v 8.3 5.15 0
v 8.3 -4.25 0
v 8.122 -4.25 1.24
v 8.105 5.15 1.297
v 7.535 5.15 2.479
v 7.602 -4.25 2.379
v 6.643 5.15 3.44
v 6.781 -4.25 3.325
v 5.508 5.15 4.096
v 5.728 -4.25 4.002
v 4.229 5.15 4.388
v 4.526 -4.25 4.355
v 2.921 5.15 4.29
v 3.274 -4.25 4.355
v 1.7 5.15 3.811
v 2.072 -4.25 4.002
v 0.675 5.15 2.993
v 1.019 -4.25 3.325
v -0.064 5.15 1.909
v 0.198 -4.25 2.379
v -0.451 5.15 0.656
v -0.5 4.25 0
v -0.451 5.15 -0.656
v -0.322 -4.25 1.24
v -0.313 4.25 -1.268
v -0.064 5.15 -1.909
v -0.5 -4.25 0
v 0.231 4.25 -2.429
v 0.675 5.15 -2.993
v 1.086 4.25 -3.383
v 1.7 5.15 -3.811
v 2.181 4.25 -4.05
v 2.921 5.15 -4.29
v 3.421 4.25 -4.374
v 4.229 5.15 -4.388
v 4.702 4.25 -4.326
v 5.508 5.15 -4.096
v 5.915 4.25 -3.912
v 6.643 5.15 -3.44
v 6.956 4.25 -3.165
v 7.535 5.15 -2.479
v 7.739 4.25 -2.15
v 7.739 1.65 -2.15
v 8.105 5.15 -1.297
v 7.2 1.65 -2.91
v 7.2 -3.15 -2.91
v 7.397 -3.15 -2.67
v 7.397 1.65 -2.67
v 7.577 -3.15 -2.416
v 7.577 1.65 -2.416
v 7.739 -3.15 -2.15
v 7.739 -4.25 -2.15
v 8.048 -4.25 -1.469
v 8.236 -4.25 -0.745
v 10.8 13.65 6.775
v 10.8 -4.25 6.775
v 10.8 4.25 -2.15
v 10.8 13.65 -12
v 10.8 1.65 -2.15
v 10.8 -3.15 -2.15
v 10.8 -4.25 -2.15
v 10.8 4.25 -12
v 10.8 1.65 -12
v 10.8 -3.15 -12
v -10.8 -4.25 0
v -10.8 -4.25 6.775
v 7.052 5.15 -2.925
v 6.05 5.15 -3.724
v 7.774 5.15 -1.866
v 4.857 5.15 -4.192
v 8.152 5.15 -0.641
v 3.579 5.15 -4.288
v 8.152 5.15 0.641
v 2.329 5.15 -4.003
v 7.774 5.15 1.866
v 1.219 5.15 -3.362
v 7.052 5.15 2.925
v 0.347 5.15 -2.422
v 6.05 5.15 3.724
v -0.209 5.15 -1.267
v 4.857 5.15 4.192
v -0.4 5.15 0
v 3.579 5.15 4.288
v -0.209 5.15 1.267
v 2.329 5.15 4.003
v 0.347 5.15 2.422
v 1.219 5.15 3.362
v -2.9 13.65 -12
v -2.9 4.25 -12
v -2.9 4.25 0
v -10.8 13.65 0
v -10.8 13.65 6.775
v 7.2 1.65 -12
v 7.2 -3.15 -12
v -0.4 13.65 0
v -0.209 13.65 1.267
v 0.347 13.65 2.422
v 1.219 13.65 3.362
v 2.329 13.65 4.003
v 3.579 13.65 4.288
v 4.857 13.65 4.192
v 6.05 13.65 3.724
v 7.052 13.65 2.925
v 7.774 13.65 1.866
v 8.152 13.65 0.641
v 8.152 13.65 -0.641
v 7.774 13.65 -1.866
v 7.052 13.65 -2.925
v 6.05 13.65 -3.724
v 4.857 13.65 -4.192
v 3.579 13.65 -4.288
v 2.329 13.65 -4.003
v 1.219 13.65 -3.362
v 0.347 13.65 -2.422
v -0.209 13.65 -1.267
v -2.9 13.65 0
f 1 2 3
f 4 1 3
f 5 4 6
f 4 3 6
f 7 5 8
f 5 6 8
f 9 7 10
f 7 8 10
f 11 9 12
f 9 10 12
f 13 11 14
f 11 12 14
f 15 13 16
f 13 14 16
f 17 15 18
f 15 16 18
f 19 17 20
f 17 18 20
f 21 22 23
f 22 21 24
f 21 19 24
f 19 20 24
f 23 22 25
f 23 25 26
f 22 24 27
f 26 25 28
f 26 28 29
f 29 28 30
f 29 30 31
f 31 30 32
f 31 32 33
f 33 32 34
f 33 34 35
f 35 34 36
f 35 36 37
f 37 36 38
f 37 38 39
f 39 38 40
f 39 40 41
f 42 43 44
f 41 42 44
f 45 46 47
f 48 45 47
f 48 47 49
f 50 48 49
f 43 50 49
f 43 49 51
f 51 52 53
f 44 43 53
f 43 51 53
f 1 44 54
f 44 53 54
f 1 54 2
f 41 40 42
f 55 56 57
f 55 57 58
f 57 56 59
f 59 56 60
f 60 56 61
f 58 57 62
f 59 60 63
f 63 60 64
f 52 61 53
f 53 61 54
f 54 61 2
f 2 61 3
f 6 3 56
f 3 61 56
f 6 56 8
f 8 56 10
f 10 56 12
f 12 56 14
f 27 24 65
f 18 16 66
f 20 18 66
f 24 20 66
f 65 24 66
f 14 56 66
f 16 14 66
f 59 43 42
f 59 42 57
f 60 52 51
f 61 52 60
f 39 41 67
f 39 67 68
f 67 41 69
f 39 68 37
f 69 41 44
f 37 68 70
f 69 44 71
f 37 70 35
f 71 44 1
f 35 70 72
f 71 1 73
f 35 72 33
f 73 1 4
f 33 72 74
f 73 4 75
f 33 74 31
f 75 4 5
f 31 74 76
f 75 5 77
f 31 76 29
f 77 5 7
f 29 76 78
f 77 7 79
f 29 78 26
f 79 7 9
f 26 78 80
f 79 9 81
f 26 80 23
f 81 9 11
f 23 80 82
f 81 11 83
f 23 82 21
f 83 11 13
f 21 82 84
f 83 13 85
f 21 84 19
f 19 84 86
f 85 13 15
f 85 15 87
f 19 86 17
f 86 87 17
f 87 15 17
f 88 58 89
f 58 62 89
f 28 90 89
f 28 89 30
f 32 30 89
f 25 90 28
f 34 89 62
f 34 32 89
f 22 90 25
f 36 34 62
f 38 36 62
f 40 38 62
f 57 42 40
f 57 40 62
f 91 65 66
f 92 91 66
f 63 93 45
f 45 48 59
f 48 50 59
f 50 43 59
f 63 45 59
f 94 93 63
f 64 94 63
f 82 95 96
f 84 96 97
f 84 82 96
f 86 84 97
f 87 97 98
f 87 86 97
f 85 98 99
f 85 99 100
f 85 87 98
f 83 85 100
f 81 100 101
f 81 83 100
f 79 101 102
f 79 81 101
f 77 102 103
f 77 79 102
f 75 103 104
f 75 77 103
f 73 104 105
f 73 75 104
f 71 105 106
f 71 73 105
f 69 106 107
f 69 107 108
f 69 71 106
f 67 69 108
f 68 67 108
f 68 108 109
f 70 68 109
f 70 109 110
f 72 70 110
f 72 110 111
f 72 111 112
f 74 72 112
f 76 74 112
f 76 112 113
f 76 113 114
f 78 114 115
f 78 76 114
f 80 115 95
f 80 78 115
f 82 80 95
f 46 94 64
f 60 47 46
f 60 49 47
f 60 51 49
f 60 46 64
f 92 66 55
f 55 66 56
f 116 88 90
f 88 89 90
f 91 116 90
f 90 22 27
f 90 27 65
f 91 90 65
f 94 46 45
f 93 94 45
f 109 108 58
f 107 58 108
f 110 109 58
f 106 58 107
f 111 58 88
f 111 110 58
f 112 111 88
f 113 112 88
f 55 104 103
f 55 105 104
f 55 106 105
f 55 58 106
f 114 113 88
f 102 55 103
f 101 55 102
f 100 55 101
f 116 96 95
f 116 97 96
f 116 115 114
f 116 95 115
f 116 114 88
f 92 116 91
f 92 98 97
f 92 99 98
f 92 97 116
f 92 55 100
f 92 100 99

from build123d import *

# Parameters (mm, degrees)
F5_W      = 7.9
F5_H      = 0.9
F5_W_2    = 3.6
F5_H_2    = 4.8
F5_W_3    = 13.7
F6_DEPTH  = 6.775
F7_DEPTH  = 12
F10_DEPTH = 2.15
F11_D     = 8.8
F8_R      = 5.975
F8_R_2    = 4.3
F12_DEPTH = 8.5


with BuildPart() as f6:
    # F5 (on Top) → F6 (new body)
    with BuildSketch(Plane.XY):
        with Locations((-6.85, 4.7)):
            Rectangle(F5_W, F5_H)
        with Locations((9, -0.75)):
            Rectangle(F5_W_2, F5_H_2)
        Polygon((-10.8, 4.25), (-10.8, -4.25), (10.8, -4.25), (10.8, -3.15), (7.2, -3.15), (7.2, 1.65), (10.8, 1.65), (10.8, 4.25), (-2.9, 4.25), align=None)
        with Locations((3.95, 4.7)):
            Rectangle(F5_W_3, F5_H)
    extrude(amount=F6_DEPTH)

    # F5 (on Top) → F7 (join)
    with BuildSketch(Plane.XY):
        with Locations((3.95, 4.7)):
            Rectangle(F5_W_3, F5_H)
        with Locations((9, -0.75)):
            Rectangle(F5_W_2, F5_H_2)
    extrude(amount=-F7_DEPTH)

    # F9 (on face) → F10 (join)
    with BuildSketch(Plane(origin=(0, 0, 0), x_dir=(1, 0, 0), z_dir=(0, 0, -1))):
        Polygon((3.95, 4.25), (3.95, -4.25), (10.8, -4.25), (10.8, -1.65), (7.2, -1.65), (7.2, 3.15), (10.8, 3.15), (10.8, 4.25), align=None)
    extrude(amount=F10_DEPTH)

    # F11 (through all)
    with Locations(Plane(origin=(0, 5.15, 0), x_dir=(-1, 0, 0), z_dir=(0, 1, 0))):
        with Locations((-3.9, 0)):
            Hole(F11_D / 2)

    # F8 (on face) → F12 (join)
    with BuildSketch(Plane(origin=(0, 5.15, 0), x_dir=(-1, 0, 0), z_dir=(0, 1, 0))):
        Polygon((10.8, 6.775), (-10.8, 6.775), (-10.8, -12), (2.9, -12), (2.9, 0), (10.8, 0), align=None)
        with Locations((-3.9, 0)):
            Circle(F8_R, mode=Mode.SUBTRACT)
        with Locations((-3.9, 0)):
            Circle(F8_R)
        with Locations((-3.9, 0)):
            Circle(F8_R_2, mode=Mode.SUBTRACT)
    extrude(amount=F12_DEPTH)


solid = f6.part
